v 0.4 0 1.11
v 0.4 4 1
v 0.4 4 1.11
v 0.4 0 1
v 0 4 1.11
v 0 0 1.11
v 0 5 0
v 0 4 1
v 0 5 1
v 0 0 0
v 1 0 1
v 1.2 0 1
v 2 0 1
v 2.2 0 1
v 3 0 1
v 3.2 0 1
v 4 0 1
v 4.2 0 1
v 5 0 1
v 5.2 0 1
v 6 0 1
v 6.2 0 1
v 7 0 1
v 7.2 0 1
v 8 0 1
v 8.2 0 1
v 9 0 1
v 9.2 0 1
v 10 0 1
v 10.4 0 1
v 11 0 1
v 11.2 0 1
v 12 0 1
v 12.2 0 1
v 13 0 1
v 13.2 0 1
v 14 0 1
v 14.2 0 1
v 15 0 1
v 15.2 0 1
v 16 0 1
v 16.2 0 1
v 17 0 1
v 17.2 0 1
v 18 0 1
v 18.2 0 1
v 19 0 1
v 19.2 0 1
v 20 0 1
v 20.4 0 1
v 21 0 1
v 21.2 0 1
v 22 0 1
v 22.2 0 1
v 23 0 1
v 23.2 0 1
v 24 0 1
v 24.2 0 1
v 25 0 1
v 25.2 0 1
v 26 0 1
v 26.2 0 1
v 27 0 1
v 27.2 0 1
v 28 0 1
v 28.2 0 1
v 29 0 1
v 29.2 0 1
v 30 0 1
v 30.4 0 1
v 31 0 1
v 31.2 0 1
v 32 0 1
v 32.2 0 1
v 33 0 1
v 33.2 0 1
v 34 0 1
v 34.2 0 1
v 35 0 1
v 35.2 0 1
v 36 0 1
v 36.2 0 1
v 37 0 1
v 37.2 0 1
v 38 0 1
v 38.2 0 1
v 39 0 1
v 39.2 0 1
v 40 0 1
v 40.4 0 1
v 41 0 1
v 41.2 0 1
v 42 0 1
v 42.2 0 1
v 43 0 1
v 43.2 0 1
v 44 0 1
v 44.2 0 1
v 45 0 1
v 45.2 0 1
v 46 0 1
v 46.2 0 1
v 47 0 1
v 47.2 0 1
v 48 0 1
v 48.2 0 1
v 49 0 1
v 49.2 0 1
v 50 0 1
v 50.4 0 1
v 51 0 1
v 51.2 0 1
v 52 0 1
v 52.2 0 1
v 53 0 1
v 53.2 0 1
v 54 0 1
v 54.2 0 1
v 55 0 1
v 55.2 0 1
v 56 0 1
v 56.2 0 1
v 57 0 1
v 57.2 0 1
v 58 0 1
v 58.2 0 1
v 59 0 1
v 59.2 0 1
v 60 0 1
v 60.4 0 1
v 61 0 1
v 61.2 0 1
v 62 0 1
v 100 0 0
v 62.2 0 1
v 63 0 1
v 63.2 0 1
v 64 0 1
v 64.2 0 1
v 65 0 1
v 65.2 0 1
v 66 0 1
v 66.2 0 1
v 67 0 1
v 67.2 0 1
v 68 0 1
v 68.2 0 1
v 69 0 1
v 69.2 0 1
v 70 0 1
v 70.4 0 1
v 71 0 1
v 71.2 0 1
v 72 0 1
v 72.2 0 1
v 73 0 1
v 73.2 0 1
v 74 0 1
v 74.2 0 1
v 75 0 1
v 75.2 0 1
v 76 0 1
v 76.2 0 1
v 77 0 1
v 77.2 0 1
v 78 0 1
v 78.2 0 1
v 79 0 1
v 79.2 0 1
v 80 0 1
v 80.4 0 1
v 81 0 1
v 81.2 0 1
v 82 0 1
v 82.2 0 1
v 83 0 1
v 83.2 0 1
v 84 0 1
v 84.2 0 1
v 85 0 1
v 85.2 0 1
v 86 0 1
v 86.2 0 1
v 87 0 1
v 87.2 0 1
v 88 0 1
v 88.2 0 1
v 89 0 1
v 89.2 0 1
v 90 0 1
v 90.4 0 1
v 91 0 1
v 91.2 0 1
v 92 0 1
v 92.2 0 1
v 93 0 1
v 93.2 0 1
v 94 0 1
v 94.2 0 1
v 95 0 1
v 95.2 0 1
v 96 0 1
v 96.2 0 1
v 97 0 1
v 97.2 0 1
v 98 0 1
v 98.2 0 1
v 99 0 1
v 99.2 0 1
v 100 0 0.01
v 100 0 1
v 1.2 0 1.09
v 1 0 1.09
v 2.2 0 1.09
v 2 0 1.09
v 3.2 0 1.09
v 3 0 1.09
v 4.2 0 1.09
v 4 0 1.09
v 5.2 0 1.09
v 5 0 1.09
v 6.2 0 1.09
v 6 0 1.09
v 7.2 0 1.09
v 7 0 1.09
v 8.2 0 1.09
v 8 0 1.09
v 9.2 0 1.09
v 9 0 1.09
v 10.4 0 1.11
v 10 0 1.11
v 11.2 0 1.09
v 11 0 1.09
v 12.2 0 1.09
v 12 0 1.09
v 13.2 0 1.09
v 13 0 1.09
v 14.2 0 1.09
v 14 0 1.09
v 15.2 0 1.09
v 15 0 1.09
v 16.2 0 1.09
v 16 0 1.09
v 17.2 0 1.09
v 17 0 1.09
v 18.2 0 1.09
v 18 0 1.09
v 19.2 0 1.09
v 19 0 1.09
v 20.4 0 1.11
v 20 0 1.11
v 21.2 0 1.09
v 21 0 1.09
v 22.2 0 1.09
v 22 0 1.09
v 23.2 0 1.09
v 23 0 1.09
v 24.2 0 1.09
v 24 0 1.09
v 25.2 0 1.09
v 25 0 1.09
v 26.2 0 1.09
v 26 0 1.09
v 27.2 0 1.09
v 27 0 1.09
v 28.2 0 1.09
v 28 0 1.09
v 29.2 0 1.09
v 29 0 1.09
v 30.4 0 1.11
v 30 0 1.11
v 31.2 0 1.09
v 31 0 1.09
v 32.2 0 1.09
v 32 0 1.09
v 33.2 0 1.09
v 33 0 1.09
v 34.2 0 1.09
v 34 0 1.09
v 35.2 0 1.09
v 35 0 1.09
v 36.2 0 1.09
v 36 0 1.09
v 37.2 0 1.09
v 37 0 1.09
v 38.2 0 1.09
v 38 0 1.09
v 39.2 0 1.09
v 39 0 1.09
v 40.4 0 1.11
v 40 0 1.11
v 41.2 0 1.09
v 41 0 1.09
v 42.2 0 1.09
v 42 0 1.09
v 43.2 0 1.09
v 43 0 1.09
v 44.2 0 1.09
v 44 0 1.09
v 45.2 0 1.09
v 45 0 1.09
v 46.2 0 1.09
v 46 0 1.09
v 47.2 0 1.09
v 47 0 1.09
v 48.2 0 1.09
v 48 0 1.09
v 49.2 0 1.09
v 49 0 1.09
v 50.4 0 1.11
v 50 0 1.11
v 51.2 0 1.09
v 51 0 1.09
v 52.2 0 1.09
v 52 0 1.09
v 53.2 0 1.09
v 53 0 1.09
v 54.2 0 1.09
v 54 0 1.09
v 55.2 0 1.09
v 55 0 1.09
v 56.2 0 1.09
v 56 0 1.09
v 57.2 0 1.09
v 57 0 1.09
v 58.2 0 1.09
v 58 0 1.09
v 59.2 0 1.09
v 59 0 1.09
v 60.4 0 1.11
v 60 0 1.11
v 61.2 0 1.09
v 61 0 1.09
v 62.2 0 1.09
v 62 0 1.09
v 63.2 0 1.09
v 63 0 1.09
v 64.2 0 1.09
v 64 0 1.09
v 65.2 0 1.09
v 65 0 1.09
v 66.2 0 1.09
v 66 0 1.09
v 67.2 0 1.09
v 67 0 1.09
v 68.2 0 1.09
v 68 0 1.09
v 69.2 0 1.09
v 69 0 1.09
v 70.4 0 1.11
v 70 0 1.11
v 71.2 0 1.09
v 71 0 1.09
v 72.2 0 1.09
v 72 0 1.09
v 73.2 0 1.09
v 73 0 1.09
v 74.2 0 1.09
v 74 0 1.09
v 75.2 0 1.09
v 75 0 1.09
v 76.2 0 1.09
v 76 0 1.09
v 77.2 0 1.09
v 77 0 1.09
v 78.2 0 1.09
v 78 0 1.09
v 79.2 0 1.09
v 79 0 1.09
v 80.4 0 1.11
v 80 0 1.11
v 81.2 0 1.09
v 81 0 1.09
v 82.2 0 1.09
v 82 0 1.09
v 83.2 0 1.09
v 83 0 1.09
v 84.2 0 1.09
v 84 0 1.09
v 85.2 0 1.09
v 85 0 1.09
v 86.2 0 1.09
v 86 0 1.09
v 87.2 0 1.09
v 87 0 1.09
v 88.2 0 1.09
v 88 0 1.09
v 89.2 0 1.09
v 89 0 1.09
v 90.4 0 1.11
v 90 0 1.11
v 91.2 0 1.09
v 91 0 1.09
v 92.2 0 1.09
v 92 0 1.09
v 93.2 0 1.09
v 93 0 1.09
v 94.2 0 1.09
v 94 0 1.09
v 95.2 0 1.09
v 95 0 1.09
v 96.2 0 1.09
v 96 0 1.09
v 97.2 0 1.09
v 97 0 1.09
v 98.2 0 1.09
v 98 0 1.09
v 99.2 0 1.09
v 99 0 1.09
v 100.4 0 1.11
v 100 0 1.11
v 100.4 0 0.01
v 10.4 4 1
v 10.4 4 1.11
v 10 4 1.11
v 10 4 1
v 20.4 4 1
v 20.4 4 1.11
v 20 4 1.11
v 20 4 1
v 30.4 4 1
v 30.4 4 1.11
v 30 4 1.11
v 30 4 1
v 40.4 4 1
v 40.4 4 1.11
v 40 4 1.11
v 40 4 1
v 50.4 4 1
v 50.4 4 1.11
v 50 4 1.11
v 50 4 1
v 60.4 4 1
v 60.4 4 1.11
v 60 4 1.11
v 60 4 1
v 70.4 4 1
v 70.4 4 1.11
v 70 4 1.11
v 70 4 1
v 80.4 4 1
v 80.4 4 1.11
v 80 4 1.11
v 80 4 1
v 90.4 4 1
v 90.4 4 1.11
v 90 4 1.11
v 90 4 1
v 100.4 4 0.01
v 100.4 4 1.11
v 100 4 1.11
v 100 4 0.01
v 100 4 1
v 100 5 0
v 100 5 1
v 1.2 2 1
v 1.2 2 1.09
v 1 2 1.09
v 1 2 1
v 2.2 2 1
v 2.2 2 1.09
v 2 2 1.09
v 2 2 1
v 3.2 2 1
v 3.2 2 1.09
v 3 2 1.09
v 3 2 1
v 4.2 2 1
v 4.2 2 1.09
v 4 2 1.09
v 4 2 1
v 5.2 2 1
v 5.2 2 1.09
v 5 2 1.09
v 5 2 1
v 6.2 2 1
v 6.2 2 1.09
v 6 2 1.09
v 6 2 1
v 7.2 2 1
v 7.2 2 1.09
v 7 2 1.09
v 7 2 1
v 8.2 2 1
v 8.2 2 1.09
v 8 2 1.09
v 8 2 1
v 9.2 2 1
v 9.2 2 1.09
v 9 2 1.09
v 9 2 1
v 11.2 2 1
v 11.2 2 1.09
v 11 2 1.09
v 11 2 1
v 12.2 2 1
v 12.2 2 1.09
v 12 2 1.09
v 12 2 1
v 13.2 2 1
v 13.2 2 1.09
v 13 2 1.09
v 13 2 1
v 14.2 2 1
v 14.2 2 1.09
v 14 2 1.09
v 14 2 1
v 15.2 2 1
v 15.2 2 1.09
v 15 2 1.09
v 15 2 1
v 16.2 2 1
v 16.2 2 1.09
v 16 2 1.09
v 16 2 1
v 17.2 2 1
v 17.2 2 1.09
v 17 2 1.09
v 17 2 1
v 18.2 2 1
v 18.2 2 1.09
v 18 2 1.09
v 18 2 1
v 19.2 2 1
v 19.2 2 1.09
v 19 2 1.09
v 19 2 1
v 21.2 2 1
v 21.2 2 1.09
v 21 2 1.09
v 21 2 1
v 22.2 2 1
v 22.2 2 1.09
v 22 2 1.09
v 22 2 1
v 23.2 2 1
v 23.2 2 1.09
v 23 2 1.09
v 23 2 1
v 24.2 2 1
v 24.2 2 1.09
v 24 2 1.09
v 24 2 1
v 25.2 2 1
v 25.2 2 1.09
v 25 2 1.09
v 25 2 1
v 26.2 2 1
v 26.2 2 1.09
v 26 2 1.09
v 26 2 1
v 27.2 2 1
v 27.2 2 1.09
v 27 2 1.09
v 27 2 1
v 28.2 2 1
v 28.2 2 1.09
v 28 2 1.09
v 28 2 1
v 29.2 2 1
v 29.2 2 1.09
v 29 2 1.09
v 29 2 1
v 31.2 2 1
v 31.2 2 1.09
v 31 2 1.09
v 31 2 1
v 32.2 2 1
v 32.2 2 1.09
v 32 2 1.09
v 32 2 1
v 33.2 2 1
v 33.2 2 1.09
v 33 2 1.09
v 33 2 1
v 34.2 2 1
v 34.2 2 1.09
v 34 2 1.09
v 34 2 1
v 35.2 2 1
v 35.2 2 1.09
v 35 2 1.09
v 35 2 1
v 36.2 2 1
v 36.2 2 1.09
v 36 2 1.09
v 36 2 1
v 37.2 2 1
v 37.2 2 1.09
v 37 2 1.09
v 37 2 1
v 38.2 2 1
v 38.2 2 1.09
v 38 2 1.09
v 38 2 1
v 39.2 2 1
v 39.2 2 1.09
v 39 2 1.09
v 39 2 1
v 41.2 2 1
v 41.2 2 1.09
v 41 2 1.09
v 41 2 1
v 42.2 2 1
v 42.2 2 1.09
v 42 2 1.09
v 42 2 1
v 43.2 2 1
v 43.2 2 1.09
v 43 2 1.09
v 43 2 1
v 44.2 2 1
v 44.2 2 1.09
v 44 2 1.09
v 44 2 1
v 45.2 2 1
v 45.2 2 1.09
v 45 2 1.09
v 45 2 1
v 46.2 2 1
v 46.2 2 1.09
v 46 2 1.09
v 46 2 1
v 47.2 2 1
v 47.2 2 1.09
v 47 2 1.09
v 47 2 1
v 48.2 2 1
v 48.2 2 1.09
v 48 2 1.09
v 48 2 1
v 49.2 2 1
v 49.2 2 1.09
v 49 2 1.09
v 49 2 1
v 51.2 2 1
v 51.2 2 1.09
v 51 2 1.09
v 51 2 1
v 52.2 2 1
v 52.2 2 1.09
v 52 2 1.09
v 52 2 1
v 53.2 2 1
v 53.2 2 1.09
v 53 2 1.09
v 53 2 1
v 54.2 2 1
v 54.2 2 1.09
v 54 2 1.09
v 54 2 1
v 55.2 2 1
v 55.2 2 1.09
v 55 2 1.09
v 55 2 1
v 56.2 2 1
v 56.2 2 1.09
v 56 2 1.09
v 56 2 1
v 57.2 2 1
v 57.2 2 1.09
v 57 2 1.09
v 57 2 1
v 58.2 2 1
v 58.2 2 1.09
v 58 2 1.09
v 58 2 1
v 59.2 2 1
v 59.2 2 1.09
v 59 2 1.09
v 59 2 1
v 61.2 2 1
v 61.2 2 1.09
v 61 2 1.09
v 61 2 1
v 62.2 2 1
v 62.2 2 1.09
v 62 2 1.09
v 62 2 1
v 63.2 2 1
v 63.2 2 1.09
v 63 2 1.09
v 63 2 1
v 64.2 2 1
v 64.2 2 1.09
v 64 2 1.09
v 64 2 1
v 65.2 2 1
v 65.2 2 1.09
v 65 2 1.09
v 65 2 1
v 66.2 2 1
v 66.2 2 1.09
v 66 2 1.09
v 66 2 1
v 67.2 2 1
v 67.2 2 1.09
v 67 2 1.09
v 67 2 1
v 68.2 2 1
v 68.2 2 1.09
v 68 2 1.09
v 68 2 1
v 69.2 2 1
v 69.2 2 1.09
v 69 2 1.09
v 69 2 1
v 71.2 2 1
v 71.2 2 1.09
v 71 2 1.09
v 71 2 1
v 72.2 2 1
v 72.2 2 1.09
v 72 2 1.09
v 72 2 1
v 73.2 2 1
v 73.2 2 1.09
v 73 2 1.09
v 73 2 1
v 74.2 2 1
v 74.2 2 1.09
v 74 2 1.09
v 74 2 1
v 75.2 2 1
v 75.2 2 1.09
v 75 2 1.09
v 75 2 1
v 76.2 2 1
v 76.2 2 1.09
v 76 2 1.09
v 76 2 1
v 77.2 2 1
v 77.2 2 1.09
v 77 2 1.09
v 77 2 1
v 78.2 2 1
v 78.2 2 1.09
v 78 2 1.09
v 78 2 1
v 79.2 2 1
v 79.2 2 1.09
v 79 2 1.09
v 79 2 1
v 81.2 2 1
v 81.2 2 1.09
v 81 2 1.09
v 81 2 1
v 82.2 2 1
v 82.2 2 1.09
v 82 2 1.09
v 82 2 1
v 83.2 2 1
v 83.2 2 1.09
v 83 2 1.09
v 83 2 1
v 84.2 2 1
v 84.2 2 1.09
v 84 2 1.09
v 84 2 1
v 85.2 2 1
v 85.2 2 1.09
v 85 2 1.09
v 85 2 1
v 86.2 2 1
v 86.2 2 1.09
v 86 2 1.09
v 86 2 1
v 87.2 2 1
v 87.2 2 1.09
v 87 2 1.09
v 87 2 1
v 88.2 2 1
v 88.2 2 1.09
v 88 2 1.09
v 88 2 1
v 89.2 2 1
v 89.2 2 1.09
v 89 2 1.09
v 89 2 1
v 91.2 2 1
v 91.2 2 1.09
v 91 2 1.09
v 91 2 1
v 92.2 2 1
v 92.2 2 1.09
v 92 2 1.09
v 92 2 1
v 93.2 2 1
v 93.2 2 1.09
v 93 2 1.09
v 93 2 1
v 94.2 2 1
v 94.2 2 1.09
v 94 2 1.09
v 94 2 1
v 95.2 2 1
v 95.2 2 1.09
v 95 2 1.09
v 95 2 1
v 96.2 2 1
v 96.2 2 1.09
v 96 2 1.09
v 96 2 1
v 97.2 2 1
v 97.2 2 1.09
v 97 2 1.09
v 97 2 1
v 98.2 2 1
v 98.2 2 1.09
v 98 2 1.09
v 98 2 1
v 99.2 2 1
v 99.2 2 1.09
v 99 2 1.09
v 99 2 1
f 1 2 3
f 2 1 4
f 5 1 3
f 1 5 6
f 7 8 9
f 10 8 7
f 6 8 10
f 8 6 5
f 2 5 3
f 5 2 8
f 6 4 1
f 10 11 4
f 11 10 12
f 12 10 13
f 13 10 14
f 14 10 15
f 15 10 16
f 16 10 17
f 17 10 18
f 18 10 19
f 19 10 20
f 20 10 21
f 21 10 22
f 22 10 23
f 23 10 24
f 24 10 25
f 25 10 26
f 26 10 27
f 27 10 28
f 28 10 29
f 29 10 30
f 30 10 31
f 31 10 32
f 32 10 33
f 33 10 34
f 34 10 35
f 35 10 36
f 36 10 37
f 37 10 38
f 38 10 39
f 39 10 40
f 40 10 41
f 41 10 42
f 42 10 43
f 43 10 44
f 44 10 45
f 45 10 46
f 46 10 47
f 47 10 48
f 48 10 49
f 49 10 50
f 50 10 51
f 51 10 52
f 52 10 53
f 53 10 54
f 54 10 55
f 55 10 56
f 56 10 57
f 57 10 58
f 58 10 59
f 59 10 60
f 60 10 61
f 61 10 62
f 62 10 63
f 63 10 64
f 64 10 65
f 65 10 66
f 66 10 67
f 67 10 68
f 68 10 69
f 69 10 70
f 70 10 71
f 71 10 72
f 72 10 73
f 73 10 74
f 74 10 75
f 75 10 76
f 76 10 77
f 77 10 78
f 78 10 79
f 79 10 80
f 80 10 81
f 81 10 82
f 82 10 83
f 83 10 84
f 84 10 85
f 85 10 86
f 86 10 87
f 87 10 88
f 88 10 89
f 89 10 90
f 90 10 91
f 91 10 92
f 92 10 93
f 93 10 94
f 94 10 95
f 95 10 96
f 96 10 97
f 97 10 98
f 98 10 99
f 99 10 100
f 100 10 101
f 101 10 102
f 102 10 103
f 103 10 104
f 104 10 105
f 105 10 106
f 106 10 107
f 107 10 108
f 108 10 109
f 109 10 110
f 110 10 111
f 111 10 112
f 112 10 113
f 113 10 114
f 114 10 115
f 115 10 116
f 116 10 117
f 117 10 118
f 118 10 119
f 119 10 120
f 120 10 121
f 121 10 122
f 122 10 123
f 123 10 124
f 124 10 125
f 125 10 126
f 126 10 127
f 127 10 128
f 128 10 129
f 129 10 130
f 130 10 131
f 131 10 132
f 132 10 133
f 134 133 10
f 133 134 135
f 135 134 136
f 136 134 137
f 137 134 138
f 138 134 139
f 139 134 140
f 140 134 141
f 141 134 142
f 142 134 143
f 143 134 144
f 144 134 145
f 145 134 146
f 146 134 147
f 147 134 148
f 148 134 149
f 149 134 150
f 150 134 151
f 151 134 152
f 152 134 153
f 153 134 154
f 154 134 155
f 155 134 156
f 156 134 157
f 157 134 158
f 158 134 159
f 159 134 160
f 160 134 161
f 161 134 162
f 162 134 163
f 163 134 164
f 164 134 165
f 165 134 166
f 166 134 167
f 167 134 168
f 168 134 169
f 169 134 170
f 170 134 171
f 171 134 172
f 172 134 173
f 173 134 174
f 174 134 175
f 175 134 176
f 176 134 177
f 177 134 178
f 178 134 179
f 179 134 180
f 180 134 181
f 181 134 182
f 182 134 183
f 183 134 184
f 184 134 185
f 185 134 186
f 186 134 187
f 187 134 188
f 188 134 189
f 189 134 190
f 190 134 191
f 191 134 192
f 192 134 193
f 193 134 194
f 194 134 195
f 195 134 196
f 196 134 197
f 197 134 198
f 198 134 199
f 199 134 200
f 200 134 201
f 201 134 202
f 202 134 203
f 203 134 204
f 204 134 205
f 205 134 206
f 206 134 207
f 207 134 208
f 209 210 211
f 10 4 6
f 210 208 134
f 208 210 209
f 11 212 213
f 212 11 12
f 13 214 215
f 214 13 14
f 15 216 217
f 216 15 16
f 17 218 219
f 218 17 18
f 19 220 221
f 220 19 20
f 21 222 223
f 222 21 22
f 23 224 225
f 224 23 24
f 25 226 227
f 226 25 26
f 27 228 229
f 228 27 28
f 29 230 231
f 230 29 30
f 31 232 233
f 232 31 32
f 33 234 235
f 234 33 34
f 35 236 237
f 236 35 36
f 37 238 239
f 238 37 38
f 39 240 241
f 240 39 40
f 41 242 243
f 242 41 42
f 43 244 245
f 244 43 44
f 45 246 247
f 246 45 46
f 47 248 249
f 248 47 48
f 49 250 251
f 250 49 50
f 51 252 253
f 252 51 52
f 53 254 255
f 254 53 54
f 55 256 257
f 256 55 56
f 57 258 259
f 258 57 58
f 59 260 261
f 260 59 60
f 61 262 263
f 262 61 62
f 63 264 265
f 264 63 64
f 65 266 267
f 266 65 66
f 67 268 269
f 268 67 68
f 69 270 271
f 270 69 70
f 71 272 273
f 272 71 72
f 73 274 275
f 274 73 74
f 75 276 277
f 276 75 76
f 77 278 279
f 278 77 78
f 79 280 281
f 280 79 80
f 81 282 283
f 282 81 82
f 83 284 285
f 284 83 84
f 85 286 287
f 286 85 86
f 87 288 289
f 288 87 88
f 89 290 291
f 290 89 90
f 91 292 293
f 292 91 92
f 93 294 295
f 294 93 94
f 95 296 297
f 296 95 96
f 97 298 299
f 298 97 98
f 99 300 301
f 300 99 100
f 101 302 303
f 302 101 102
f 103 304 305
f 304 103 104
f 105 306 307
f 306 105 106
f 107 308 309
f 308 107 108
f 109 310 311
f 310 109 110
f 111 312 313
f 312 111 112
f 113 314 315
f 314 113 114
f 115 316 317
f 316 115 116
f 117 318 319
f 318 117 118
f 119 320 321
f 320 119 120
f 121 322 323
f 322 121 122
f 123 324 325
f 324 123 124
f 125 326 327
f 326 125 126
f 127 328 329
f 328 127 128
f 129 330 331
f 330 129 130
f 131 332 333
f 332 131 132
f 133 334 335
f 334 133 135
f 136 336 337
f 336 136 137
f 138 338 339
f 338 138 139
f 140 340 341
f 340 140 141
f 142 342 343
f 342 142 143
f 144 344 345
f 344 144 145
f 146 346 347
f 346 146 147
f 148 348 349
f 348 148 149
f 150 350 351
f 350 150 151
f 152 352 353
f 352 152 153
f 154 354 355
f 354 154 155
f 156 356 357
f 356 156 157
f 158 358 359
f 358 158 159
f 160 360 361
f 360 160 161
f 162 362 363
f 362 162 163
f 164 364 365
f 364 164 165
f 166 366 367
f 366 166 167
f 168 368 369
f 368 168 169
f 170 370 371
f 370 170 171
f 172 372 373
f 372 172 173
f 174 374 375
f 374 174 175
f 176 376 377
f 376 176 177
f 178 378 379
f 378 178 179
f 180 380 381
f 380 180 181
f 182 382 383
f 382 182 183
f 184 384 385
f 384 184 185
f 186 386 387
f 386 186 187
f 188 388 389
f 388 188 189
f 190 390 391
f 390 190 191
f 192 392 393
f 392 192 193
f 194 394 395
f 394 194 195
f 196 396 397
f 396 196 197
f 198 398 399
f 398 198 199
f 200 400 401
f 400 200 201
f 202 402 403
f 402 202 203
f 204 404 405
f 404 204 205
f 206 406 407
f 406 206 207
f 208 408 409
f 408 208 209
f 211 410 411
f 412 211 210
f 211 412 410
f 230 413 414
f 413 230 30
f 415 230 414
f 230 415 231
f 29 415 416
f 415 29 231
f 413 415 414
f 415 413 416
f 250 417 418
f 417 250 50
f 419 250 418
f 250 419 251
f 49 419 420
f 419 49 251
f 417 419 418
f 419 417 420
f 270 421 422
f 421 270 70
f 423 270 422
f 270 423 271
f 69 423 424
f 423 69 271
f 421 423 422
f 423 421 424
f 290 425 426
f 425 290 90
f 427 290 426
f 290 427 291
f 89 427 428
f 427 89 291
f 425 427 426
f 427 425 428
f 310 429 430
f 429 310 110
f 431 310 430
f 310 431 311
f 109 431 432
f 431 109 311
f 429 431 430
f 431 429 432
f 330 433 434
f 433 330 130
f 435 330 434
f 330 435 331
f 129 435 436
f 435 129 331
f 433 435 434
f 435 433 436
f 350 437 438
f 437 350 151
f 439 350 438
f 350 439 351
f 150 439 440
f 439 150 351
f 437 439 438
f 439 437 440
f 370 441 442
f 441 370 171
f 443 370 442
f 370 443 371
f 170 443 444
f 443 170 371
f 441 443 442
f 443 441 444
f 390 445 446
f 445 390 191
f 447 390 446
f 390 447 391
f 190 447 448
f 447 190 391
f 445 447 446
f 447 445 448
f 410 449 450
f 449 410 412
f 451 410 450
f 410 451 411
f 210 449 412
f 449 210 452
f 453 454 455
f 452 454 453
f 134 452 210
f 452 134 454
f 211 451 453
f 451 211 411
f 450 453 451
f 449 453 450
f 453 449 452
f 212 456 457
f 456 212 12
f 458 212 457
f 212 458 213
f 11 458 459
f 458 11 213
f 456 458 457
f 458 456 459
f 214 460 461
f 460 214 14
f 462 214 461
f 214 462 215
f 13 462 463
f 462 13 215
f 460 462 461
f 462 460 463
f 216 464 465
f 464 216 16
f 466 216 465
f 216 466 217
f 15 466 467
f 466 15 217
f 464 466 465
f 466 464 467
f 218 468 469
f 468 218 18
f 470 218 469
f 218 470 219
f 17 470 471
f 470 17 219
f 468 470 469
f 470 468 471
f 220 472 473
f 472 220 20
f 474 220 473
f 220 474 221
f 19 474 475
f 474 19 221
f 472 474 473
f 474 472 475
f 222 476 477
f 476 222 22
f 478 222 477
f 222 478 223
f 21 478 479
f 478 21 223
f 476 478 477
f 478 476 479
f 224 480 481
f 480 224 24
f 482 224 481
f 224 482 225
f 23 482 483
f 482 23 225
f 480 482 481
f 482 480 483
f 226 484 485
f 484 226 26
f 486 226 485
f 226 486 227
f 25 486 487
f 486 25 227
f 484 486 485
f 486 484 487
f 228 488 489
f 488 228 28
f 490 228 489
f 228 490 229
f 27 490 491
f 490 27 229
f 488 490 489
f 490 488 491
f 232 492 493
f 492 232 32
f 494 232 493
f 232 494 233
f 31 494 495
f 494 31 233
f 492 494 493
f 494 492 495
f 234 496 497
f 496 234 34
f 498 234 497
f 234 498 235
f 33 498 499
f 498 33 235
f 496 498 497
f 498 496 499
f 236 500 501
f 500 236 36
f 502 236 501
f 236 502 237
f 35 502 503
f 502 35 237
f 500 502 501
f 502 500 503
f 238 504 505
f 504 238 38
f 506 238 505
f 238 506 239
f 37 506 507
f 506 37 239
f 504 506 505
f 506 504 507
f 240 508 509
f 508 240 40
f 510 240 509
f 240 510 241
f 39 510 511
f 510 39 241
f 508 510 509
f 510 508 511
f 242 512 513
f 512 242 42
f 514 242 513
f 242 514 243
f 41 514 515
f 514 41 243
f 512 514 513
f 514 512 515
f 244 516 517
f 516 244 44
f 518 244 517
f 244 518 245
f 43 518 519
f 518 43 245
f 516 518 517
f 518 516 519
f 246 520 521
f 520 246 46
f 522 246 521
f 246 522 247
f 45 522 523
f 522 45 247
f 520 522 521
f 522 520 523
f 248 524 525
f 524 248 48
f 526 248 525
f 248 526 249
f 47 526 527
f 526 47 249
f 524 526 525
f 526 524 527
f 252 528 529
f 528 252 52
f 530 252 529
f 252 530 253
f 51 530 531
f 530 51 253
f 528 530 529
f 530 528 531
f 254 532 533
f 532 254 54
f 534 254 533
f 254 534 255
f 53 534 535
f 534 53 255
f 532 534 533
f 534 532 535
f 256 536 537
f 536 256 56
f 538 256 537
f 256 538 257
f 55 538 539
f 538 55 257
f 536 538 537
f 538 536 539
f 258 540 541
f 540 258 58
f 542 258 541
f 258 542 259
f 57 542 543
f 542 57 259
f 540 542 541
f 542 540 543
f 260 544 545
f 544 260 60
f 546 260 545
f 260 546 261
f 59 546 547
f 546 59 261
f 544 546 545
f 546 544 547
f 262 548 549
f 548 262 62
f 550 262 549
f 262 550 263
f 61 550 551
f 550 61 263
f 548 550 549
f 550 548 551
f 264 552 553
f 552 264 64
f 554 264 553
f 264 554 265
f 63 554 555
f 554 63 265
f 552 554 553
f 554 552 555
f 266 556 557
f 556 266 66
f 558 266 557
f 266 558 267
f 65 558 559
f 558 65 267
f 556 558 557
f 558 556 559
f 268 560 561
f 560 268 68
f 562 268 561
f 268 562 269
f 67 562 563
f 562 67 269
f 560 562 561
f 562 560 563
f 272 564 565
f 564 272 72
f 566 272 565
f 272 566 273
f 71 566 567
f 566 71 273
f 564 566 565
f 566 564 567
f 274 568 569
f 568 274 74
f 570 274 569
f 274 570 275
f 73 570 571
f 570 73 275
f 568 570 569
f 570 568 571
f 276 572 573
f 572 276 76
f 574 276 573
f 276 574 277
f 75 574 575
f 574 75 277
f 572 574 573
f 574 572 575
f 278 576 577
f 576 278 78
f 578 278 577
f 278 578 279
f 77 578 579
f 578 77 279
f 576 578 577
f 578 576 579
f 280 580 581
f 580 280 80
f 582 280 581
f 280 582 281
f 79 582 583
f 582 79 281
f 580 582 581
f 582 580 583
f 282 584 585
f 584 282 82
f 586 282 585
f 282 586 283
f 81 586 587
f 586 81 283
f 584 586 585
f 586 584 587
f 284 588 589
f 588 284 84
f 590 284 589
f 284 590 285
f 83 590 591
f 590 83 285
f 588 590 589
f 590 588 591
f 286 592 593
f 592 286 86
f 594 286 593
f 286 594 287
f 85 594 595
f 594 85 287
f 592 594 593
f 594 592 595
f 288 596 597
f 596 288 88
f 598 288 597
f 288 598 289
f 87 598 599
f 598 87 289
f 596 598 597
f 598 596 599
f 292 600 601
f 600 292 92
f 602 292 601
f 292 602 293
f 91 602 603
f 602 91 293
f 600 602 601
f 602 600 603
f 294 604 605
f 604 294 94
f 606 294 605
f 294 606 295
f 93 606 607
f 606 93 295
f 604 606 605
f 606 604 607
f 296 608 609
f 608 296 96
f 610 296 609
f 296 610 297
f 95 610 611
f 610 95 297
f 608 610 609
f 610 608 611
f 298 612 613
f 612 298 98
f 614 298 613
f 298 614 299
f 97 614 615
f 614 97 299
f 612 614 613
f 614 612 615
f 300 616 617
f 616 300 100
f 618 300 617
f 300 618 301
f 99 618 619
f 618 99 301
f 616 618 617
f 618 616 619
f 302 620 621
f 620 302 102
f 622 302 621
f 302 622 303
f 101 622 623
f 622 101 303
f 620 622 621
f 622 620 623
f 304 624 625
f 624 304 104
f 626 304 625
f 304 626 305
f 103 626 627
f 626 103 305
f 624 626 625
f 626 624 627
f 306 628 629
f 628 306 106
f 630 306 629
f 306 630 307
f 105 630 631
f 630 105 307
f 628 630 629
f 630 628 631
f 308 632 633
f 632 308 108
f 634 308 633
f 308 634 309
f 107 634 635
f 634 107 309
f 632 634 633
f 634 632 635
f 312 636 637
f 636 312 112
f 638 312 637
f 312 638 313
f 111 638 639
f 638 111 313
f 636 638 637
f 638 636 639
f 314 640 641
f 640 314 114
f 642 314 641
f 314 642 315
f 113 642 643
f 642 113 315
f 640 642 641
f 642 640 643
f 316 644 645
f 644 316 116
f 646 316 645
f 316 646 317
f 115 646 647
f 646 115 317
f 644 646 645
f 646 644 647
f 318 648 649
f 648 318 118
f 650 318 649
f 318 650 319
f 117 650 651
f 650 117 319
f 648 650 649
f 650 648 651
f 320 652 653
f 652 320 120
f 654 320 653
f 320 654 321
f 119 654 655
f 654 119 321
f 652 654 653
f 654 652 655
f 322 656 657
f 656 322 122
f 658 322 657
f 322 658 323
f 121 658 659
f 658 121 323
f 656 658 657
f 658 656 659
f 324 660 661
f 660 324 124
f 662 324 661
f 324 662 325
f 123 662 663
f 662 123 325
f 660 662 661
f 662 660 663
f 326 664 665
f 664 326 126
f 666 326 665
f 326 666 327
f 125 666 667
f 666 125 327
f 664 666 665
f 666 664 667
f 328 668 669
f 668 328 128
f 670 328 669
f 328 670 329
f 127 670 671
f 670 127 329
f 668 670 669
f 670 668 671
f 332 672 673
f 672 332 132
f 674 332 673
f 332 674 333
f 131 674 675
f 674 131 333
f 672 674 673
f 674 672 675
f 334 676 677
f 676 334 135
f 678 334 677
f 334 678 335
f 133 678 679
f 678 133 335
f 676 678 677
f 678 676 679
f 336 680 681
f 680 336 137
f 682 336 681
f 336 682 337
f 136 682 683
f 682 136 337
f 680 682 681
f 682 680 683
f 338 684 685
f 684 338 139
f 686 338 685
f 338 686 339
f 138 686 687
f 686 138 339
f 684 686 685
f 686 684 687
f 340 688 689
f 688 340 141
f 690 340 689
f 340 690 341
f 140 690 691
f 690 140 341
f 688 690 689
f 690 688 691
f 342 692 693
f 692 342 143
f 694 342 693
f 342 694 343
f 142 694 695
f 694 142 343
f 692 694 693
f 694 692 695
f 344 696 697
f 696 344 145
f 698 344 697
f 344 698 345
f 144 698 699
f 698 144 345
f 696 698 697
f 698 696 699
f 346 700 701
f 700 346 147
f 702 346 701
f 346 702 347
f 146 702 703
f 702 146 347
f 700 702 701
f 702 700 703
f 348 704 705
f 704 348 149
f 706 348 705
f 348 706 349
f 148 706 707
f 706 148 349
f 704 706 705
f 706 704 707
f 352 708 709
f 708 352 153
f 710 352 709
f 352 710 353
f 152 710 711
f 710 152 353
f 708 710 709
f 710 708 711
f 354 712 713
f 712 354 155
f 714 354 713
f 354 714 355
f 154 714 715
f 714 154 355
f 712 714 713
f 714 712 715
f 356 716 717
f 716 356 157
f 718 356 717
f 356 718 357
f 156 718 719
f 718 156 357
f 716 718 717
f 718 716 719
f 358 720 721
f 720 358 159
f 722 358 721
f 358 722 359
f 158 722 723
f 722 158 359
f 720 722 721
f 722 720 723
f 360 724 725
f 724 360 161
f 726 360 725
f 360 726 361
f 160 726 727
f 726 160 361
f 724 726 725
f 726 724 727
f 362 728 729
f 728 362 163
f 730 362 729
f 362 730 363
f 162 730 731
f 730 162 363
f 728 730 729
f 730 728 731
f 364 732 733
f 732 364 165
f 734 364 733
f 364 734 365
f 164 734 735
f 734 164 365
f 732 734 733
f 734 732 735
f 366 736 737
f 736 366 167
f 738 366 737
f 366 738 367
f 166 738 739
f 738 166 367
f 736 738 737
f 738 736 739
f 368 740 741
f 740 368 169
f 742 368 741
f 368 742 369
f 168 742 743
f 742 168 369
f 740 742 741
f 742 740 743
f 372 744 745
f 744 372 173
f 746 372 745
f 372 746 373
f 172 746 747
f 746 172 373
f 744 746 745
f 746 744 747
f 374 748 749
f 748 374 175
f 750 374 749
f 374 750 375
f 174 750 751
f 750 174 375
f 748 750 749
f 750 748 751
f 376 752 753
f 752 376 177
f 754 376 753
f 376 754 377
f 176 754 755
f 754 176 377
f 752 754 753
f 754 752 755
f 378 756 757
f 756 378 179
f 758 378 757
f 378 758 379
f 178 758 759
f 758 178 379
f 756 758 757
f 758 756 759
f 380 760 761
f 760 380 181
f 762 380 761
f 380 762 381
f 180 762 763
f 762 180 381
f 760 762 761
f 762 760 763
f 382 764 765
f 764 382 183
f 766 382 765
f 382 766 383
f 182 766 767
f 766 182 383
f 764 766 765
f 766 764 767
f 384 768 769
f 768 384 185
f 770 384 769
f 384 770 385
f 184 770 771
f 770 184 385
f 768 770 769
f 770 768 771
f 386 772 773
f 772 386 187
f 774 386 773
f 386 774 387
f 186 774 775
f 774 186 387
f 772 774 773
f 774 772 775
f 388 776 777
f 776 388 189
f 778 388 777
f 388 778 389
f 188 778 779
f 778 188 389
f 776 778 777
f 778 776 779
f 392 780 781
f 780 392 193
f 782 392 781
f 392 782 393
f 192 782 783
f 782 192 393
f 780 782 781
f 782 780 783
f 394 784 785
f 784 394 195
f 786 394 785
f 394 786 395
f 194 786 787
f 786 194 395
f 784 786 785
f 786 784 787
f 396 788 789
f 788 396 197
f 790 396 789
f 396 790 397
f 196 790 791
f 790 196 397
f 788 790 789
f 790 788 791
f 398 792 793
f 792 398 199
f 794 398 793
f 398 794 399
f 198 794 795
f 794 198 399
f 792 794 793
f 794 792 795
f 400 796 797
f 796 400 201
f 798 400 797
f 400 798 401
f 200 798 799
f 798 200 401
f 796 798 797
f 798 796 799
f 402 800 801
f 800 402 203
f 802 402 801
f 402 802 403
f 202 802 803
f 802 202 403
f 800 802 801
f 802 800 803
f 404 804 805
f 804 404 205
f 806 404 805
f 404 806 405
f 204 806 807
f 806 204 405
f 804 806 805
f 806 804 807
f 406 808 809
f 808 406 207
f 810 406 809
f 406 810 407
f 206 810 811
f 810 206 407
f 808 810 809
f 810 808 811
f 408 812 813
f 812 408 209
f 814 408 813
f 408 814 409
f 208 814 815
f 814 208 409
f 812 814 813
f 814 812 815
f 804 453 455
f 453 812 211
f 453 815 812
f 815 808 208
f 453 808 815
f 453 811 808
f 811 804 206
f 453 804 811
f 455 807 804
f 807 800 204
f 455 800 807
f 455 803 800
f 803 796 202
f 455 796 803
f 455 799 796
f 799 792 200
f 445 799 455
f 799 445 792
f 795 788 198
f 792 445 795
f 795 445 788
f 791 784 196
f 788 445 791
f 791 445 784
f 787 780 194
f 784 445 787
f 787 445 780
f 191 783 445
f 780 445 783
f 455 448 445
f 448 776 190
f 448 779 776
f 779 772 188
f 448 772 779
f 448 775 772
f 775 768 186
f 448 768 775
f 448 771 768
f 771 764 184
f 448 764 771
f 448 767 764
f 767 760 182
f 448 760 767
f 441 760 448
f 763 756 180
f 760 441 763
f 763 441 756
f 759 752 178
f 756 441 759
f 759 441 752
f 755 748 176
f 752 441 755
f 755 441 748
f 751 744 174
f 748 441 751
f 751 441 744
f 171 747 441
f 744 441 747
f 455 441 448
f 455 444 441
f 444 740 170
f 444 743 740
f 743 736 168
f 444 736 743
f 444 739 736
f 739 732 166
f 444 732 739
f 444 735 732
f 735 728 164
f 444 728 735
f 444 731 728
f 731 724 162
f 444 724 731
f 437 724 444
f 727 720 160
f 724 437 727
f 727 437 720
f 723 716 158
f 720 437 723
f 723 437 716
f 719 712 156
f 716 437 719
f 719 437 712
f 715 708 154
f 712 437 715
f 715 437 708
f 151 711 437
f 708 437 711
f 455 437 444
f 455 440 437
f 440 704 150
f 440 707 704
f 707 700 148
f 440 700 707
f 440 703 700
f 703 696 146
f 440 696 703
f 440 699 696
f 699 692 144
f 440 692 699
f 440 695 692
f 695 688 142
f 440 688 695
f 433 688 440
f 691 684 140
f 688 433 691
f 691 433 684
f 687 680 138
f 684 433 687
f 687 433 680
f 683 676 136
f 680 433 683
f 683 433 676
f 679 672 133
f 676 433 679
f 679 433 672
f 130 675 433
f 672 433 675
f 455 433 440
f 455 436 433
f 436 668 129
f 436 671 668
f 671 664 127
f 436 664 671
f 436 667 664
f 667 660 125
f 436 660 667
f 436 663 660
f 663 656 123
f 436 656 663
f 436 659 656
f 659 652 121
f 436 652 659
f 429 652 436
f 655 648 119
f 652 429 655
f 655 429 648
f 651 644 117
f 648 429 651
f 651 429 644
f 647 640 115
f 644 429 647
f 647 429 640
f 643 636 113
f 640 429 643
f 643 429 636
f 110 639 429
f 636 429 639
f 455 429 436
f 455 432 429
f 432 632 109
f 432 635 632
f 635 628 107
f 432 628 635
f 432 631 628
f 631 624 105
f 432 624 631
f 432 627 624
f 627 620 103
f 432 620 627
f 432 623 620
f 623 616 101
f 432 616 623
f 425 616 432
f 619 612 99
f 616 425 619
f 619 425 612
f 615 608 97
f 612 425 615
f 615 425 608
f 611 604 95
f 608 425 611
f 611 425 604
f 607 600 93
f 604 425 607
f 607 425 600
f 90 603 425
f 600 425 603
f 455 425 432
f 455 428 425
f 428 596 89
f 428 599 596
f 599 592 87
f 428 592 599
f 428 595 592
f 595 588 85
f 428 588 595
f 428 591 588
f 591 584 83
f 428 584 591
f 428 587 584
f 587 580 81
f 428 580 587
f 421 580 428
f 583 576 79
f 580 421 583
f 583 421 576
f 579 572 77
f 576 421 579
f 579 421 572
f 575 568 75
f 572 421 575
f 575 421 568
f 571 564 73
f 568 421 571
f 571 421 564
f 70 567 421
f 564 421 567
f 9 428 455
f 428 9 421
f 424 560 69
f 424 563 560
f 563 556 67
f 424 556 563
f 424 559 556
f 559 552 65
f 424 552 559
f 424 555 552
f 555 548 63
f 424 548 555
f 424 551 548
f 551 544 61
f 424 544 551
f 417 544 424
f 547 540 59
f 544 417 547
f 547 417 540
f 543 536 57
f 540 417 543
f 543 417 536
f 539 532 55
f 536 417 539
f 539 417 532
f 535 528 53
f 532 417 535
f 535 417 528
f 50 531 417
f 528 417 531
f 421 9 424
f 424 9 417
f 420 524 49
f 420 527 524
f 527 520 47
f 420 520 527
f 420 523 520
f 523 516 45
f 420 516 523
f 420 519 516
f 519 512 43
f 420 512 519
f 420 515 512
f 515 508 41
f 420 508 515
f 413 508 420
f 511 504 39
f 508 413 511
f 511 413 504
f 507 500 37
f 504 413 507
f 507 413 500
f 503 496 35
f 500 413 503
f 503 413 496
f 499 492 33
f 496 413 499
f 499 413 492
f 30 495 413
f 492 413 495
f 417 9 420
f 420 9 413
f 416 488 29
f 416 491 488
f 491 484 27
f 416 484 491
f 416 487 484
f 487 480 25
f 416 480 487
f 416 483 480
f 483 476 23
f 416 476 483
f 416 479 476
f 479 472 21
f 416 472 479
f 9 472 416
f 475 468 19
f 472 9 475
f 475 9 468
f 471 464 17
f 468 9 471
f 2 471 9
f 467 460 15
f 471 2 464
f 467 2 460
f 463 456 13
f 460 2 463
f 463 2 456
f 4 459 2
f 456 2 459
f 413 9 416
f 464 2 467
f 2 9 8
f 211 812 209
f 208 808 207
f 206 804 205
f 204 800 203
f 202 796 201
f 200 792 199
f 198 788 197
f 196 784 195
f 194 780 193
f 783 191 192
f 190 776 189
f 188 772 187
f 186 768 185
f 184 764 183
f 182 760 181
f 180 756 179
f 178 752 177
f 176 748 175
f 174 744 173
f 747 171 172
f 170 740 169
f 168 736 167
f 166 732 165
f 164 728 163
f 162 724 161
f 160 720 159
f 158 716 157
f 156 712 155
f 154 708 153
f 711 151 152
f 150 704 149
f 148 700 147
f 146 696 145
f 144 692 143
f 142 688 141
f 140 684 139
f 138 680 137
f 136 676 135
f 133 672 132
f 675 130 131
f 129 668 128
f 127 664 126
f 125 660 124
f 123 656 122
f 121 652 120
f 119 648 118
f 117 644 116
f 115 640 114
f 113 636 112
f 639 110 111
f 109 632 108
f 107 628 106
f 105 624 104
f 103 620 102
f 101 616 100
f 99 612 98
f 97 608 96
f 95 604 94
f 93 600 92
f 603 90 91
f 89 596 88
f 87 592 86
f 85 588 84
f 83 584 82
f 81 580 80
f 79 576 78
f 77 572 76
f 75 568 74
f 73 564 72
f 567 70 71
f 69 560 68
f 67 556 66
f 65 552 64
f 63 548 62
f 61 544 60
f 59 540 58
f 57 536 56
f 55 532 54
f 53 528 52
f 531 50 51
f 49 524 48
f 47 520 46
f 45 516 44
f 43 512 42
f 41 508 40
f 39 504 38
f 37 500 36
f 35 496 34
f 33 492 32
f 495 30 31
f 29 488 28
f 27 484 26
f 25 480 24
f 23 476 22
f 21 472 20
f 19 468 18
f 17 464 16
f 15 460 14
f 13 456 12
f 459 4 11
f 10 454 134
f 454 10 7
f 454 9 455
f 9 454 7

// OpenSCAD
// 100mm Ruler
// By Chris Leaver 2014

// Import it into your OpenSCAD project and call it with 
// use <ruler_100mm.scad>
// then...
// ruler_mm();
// Offset, duplicate and rotate it as required



module ruler_mm(mark10mm = 1, mark1mm = 1) {
    // main block
    color("gray") {
        cube([100,5,1]);
    }

    // 10mm Index Marks
    if (mark10mm) {
        for (i=[0:10:100]) {
            color("black") {
                translate([i,0,0.01]) {
                    cube([0.4, 4, 1.1]);
                }
            }
        }
    }
    
    // 1mm index marks
    if (mark1mm) {
        for (i=[0:1:100]) {
            color("lightgray") {
                translate([i,0,0.01]) {
                    cube([0.2, 2, 1.08]);
                }
            }
        }
    }
}

ruler_mm(1, 1);
